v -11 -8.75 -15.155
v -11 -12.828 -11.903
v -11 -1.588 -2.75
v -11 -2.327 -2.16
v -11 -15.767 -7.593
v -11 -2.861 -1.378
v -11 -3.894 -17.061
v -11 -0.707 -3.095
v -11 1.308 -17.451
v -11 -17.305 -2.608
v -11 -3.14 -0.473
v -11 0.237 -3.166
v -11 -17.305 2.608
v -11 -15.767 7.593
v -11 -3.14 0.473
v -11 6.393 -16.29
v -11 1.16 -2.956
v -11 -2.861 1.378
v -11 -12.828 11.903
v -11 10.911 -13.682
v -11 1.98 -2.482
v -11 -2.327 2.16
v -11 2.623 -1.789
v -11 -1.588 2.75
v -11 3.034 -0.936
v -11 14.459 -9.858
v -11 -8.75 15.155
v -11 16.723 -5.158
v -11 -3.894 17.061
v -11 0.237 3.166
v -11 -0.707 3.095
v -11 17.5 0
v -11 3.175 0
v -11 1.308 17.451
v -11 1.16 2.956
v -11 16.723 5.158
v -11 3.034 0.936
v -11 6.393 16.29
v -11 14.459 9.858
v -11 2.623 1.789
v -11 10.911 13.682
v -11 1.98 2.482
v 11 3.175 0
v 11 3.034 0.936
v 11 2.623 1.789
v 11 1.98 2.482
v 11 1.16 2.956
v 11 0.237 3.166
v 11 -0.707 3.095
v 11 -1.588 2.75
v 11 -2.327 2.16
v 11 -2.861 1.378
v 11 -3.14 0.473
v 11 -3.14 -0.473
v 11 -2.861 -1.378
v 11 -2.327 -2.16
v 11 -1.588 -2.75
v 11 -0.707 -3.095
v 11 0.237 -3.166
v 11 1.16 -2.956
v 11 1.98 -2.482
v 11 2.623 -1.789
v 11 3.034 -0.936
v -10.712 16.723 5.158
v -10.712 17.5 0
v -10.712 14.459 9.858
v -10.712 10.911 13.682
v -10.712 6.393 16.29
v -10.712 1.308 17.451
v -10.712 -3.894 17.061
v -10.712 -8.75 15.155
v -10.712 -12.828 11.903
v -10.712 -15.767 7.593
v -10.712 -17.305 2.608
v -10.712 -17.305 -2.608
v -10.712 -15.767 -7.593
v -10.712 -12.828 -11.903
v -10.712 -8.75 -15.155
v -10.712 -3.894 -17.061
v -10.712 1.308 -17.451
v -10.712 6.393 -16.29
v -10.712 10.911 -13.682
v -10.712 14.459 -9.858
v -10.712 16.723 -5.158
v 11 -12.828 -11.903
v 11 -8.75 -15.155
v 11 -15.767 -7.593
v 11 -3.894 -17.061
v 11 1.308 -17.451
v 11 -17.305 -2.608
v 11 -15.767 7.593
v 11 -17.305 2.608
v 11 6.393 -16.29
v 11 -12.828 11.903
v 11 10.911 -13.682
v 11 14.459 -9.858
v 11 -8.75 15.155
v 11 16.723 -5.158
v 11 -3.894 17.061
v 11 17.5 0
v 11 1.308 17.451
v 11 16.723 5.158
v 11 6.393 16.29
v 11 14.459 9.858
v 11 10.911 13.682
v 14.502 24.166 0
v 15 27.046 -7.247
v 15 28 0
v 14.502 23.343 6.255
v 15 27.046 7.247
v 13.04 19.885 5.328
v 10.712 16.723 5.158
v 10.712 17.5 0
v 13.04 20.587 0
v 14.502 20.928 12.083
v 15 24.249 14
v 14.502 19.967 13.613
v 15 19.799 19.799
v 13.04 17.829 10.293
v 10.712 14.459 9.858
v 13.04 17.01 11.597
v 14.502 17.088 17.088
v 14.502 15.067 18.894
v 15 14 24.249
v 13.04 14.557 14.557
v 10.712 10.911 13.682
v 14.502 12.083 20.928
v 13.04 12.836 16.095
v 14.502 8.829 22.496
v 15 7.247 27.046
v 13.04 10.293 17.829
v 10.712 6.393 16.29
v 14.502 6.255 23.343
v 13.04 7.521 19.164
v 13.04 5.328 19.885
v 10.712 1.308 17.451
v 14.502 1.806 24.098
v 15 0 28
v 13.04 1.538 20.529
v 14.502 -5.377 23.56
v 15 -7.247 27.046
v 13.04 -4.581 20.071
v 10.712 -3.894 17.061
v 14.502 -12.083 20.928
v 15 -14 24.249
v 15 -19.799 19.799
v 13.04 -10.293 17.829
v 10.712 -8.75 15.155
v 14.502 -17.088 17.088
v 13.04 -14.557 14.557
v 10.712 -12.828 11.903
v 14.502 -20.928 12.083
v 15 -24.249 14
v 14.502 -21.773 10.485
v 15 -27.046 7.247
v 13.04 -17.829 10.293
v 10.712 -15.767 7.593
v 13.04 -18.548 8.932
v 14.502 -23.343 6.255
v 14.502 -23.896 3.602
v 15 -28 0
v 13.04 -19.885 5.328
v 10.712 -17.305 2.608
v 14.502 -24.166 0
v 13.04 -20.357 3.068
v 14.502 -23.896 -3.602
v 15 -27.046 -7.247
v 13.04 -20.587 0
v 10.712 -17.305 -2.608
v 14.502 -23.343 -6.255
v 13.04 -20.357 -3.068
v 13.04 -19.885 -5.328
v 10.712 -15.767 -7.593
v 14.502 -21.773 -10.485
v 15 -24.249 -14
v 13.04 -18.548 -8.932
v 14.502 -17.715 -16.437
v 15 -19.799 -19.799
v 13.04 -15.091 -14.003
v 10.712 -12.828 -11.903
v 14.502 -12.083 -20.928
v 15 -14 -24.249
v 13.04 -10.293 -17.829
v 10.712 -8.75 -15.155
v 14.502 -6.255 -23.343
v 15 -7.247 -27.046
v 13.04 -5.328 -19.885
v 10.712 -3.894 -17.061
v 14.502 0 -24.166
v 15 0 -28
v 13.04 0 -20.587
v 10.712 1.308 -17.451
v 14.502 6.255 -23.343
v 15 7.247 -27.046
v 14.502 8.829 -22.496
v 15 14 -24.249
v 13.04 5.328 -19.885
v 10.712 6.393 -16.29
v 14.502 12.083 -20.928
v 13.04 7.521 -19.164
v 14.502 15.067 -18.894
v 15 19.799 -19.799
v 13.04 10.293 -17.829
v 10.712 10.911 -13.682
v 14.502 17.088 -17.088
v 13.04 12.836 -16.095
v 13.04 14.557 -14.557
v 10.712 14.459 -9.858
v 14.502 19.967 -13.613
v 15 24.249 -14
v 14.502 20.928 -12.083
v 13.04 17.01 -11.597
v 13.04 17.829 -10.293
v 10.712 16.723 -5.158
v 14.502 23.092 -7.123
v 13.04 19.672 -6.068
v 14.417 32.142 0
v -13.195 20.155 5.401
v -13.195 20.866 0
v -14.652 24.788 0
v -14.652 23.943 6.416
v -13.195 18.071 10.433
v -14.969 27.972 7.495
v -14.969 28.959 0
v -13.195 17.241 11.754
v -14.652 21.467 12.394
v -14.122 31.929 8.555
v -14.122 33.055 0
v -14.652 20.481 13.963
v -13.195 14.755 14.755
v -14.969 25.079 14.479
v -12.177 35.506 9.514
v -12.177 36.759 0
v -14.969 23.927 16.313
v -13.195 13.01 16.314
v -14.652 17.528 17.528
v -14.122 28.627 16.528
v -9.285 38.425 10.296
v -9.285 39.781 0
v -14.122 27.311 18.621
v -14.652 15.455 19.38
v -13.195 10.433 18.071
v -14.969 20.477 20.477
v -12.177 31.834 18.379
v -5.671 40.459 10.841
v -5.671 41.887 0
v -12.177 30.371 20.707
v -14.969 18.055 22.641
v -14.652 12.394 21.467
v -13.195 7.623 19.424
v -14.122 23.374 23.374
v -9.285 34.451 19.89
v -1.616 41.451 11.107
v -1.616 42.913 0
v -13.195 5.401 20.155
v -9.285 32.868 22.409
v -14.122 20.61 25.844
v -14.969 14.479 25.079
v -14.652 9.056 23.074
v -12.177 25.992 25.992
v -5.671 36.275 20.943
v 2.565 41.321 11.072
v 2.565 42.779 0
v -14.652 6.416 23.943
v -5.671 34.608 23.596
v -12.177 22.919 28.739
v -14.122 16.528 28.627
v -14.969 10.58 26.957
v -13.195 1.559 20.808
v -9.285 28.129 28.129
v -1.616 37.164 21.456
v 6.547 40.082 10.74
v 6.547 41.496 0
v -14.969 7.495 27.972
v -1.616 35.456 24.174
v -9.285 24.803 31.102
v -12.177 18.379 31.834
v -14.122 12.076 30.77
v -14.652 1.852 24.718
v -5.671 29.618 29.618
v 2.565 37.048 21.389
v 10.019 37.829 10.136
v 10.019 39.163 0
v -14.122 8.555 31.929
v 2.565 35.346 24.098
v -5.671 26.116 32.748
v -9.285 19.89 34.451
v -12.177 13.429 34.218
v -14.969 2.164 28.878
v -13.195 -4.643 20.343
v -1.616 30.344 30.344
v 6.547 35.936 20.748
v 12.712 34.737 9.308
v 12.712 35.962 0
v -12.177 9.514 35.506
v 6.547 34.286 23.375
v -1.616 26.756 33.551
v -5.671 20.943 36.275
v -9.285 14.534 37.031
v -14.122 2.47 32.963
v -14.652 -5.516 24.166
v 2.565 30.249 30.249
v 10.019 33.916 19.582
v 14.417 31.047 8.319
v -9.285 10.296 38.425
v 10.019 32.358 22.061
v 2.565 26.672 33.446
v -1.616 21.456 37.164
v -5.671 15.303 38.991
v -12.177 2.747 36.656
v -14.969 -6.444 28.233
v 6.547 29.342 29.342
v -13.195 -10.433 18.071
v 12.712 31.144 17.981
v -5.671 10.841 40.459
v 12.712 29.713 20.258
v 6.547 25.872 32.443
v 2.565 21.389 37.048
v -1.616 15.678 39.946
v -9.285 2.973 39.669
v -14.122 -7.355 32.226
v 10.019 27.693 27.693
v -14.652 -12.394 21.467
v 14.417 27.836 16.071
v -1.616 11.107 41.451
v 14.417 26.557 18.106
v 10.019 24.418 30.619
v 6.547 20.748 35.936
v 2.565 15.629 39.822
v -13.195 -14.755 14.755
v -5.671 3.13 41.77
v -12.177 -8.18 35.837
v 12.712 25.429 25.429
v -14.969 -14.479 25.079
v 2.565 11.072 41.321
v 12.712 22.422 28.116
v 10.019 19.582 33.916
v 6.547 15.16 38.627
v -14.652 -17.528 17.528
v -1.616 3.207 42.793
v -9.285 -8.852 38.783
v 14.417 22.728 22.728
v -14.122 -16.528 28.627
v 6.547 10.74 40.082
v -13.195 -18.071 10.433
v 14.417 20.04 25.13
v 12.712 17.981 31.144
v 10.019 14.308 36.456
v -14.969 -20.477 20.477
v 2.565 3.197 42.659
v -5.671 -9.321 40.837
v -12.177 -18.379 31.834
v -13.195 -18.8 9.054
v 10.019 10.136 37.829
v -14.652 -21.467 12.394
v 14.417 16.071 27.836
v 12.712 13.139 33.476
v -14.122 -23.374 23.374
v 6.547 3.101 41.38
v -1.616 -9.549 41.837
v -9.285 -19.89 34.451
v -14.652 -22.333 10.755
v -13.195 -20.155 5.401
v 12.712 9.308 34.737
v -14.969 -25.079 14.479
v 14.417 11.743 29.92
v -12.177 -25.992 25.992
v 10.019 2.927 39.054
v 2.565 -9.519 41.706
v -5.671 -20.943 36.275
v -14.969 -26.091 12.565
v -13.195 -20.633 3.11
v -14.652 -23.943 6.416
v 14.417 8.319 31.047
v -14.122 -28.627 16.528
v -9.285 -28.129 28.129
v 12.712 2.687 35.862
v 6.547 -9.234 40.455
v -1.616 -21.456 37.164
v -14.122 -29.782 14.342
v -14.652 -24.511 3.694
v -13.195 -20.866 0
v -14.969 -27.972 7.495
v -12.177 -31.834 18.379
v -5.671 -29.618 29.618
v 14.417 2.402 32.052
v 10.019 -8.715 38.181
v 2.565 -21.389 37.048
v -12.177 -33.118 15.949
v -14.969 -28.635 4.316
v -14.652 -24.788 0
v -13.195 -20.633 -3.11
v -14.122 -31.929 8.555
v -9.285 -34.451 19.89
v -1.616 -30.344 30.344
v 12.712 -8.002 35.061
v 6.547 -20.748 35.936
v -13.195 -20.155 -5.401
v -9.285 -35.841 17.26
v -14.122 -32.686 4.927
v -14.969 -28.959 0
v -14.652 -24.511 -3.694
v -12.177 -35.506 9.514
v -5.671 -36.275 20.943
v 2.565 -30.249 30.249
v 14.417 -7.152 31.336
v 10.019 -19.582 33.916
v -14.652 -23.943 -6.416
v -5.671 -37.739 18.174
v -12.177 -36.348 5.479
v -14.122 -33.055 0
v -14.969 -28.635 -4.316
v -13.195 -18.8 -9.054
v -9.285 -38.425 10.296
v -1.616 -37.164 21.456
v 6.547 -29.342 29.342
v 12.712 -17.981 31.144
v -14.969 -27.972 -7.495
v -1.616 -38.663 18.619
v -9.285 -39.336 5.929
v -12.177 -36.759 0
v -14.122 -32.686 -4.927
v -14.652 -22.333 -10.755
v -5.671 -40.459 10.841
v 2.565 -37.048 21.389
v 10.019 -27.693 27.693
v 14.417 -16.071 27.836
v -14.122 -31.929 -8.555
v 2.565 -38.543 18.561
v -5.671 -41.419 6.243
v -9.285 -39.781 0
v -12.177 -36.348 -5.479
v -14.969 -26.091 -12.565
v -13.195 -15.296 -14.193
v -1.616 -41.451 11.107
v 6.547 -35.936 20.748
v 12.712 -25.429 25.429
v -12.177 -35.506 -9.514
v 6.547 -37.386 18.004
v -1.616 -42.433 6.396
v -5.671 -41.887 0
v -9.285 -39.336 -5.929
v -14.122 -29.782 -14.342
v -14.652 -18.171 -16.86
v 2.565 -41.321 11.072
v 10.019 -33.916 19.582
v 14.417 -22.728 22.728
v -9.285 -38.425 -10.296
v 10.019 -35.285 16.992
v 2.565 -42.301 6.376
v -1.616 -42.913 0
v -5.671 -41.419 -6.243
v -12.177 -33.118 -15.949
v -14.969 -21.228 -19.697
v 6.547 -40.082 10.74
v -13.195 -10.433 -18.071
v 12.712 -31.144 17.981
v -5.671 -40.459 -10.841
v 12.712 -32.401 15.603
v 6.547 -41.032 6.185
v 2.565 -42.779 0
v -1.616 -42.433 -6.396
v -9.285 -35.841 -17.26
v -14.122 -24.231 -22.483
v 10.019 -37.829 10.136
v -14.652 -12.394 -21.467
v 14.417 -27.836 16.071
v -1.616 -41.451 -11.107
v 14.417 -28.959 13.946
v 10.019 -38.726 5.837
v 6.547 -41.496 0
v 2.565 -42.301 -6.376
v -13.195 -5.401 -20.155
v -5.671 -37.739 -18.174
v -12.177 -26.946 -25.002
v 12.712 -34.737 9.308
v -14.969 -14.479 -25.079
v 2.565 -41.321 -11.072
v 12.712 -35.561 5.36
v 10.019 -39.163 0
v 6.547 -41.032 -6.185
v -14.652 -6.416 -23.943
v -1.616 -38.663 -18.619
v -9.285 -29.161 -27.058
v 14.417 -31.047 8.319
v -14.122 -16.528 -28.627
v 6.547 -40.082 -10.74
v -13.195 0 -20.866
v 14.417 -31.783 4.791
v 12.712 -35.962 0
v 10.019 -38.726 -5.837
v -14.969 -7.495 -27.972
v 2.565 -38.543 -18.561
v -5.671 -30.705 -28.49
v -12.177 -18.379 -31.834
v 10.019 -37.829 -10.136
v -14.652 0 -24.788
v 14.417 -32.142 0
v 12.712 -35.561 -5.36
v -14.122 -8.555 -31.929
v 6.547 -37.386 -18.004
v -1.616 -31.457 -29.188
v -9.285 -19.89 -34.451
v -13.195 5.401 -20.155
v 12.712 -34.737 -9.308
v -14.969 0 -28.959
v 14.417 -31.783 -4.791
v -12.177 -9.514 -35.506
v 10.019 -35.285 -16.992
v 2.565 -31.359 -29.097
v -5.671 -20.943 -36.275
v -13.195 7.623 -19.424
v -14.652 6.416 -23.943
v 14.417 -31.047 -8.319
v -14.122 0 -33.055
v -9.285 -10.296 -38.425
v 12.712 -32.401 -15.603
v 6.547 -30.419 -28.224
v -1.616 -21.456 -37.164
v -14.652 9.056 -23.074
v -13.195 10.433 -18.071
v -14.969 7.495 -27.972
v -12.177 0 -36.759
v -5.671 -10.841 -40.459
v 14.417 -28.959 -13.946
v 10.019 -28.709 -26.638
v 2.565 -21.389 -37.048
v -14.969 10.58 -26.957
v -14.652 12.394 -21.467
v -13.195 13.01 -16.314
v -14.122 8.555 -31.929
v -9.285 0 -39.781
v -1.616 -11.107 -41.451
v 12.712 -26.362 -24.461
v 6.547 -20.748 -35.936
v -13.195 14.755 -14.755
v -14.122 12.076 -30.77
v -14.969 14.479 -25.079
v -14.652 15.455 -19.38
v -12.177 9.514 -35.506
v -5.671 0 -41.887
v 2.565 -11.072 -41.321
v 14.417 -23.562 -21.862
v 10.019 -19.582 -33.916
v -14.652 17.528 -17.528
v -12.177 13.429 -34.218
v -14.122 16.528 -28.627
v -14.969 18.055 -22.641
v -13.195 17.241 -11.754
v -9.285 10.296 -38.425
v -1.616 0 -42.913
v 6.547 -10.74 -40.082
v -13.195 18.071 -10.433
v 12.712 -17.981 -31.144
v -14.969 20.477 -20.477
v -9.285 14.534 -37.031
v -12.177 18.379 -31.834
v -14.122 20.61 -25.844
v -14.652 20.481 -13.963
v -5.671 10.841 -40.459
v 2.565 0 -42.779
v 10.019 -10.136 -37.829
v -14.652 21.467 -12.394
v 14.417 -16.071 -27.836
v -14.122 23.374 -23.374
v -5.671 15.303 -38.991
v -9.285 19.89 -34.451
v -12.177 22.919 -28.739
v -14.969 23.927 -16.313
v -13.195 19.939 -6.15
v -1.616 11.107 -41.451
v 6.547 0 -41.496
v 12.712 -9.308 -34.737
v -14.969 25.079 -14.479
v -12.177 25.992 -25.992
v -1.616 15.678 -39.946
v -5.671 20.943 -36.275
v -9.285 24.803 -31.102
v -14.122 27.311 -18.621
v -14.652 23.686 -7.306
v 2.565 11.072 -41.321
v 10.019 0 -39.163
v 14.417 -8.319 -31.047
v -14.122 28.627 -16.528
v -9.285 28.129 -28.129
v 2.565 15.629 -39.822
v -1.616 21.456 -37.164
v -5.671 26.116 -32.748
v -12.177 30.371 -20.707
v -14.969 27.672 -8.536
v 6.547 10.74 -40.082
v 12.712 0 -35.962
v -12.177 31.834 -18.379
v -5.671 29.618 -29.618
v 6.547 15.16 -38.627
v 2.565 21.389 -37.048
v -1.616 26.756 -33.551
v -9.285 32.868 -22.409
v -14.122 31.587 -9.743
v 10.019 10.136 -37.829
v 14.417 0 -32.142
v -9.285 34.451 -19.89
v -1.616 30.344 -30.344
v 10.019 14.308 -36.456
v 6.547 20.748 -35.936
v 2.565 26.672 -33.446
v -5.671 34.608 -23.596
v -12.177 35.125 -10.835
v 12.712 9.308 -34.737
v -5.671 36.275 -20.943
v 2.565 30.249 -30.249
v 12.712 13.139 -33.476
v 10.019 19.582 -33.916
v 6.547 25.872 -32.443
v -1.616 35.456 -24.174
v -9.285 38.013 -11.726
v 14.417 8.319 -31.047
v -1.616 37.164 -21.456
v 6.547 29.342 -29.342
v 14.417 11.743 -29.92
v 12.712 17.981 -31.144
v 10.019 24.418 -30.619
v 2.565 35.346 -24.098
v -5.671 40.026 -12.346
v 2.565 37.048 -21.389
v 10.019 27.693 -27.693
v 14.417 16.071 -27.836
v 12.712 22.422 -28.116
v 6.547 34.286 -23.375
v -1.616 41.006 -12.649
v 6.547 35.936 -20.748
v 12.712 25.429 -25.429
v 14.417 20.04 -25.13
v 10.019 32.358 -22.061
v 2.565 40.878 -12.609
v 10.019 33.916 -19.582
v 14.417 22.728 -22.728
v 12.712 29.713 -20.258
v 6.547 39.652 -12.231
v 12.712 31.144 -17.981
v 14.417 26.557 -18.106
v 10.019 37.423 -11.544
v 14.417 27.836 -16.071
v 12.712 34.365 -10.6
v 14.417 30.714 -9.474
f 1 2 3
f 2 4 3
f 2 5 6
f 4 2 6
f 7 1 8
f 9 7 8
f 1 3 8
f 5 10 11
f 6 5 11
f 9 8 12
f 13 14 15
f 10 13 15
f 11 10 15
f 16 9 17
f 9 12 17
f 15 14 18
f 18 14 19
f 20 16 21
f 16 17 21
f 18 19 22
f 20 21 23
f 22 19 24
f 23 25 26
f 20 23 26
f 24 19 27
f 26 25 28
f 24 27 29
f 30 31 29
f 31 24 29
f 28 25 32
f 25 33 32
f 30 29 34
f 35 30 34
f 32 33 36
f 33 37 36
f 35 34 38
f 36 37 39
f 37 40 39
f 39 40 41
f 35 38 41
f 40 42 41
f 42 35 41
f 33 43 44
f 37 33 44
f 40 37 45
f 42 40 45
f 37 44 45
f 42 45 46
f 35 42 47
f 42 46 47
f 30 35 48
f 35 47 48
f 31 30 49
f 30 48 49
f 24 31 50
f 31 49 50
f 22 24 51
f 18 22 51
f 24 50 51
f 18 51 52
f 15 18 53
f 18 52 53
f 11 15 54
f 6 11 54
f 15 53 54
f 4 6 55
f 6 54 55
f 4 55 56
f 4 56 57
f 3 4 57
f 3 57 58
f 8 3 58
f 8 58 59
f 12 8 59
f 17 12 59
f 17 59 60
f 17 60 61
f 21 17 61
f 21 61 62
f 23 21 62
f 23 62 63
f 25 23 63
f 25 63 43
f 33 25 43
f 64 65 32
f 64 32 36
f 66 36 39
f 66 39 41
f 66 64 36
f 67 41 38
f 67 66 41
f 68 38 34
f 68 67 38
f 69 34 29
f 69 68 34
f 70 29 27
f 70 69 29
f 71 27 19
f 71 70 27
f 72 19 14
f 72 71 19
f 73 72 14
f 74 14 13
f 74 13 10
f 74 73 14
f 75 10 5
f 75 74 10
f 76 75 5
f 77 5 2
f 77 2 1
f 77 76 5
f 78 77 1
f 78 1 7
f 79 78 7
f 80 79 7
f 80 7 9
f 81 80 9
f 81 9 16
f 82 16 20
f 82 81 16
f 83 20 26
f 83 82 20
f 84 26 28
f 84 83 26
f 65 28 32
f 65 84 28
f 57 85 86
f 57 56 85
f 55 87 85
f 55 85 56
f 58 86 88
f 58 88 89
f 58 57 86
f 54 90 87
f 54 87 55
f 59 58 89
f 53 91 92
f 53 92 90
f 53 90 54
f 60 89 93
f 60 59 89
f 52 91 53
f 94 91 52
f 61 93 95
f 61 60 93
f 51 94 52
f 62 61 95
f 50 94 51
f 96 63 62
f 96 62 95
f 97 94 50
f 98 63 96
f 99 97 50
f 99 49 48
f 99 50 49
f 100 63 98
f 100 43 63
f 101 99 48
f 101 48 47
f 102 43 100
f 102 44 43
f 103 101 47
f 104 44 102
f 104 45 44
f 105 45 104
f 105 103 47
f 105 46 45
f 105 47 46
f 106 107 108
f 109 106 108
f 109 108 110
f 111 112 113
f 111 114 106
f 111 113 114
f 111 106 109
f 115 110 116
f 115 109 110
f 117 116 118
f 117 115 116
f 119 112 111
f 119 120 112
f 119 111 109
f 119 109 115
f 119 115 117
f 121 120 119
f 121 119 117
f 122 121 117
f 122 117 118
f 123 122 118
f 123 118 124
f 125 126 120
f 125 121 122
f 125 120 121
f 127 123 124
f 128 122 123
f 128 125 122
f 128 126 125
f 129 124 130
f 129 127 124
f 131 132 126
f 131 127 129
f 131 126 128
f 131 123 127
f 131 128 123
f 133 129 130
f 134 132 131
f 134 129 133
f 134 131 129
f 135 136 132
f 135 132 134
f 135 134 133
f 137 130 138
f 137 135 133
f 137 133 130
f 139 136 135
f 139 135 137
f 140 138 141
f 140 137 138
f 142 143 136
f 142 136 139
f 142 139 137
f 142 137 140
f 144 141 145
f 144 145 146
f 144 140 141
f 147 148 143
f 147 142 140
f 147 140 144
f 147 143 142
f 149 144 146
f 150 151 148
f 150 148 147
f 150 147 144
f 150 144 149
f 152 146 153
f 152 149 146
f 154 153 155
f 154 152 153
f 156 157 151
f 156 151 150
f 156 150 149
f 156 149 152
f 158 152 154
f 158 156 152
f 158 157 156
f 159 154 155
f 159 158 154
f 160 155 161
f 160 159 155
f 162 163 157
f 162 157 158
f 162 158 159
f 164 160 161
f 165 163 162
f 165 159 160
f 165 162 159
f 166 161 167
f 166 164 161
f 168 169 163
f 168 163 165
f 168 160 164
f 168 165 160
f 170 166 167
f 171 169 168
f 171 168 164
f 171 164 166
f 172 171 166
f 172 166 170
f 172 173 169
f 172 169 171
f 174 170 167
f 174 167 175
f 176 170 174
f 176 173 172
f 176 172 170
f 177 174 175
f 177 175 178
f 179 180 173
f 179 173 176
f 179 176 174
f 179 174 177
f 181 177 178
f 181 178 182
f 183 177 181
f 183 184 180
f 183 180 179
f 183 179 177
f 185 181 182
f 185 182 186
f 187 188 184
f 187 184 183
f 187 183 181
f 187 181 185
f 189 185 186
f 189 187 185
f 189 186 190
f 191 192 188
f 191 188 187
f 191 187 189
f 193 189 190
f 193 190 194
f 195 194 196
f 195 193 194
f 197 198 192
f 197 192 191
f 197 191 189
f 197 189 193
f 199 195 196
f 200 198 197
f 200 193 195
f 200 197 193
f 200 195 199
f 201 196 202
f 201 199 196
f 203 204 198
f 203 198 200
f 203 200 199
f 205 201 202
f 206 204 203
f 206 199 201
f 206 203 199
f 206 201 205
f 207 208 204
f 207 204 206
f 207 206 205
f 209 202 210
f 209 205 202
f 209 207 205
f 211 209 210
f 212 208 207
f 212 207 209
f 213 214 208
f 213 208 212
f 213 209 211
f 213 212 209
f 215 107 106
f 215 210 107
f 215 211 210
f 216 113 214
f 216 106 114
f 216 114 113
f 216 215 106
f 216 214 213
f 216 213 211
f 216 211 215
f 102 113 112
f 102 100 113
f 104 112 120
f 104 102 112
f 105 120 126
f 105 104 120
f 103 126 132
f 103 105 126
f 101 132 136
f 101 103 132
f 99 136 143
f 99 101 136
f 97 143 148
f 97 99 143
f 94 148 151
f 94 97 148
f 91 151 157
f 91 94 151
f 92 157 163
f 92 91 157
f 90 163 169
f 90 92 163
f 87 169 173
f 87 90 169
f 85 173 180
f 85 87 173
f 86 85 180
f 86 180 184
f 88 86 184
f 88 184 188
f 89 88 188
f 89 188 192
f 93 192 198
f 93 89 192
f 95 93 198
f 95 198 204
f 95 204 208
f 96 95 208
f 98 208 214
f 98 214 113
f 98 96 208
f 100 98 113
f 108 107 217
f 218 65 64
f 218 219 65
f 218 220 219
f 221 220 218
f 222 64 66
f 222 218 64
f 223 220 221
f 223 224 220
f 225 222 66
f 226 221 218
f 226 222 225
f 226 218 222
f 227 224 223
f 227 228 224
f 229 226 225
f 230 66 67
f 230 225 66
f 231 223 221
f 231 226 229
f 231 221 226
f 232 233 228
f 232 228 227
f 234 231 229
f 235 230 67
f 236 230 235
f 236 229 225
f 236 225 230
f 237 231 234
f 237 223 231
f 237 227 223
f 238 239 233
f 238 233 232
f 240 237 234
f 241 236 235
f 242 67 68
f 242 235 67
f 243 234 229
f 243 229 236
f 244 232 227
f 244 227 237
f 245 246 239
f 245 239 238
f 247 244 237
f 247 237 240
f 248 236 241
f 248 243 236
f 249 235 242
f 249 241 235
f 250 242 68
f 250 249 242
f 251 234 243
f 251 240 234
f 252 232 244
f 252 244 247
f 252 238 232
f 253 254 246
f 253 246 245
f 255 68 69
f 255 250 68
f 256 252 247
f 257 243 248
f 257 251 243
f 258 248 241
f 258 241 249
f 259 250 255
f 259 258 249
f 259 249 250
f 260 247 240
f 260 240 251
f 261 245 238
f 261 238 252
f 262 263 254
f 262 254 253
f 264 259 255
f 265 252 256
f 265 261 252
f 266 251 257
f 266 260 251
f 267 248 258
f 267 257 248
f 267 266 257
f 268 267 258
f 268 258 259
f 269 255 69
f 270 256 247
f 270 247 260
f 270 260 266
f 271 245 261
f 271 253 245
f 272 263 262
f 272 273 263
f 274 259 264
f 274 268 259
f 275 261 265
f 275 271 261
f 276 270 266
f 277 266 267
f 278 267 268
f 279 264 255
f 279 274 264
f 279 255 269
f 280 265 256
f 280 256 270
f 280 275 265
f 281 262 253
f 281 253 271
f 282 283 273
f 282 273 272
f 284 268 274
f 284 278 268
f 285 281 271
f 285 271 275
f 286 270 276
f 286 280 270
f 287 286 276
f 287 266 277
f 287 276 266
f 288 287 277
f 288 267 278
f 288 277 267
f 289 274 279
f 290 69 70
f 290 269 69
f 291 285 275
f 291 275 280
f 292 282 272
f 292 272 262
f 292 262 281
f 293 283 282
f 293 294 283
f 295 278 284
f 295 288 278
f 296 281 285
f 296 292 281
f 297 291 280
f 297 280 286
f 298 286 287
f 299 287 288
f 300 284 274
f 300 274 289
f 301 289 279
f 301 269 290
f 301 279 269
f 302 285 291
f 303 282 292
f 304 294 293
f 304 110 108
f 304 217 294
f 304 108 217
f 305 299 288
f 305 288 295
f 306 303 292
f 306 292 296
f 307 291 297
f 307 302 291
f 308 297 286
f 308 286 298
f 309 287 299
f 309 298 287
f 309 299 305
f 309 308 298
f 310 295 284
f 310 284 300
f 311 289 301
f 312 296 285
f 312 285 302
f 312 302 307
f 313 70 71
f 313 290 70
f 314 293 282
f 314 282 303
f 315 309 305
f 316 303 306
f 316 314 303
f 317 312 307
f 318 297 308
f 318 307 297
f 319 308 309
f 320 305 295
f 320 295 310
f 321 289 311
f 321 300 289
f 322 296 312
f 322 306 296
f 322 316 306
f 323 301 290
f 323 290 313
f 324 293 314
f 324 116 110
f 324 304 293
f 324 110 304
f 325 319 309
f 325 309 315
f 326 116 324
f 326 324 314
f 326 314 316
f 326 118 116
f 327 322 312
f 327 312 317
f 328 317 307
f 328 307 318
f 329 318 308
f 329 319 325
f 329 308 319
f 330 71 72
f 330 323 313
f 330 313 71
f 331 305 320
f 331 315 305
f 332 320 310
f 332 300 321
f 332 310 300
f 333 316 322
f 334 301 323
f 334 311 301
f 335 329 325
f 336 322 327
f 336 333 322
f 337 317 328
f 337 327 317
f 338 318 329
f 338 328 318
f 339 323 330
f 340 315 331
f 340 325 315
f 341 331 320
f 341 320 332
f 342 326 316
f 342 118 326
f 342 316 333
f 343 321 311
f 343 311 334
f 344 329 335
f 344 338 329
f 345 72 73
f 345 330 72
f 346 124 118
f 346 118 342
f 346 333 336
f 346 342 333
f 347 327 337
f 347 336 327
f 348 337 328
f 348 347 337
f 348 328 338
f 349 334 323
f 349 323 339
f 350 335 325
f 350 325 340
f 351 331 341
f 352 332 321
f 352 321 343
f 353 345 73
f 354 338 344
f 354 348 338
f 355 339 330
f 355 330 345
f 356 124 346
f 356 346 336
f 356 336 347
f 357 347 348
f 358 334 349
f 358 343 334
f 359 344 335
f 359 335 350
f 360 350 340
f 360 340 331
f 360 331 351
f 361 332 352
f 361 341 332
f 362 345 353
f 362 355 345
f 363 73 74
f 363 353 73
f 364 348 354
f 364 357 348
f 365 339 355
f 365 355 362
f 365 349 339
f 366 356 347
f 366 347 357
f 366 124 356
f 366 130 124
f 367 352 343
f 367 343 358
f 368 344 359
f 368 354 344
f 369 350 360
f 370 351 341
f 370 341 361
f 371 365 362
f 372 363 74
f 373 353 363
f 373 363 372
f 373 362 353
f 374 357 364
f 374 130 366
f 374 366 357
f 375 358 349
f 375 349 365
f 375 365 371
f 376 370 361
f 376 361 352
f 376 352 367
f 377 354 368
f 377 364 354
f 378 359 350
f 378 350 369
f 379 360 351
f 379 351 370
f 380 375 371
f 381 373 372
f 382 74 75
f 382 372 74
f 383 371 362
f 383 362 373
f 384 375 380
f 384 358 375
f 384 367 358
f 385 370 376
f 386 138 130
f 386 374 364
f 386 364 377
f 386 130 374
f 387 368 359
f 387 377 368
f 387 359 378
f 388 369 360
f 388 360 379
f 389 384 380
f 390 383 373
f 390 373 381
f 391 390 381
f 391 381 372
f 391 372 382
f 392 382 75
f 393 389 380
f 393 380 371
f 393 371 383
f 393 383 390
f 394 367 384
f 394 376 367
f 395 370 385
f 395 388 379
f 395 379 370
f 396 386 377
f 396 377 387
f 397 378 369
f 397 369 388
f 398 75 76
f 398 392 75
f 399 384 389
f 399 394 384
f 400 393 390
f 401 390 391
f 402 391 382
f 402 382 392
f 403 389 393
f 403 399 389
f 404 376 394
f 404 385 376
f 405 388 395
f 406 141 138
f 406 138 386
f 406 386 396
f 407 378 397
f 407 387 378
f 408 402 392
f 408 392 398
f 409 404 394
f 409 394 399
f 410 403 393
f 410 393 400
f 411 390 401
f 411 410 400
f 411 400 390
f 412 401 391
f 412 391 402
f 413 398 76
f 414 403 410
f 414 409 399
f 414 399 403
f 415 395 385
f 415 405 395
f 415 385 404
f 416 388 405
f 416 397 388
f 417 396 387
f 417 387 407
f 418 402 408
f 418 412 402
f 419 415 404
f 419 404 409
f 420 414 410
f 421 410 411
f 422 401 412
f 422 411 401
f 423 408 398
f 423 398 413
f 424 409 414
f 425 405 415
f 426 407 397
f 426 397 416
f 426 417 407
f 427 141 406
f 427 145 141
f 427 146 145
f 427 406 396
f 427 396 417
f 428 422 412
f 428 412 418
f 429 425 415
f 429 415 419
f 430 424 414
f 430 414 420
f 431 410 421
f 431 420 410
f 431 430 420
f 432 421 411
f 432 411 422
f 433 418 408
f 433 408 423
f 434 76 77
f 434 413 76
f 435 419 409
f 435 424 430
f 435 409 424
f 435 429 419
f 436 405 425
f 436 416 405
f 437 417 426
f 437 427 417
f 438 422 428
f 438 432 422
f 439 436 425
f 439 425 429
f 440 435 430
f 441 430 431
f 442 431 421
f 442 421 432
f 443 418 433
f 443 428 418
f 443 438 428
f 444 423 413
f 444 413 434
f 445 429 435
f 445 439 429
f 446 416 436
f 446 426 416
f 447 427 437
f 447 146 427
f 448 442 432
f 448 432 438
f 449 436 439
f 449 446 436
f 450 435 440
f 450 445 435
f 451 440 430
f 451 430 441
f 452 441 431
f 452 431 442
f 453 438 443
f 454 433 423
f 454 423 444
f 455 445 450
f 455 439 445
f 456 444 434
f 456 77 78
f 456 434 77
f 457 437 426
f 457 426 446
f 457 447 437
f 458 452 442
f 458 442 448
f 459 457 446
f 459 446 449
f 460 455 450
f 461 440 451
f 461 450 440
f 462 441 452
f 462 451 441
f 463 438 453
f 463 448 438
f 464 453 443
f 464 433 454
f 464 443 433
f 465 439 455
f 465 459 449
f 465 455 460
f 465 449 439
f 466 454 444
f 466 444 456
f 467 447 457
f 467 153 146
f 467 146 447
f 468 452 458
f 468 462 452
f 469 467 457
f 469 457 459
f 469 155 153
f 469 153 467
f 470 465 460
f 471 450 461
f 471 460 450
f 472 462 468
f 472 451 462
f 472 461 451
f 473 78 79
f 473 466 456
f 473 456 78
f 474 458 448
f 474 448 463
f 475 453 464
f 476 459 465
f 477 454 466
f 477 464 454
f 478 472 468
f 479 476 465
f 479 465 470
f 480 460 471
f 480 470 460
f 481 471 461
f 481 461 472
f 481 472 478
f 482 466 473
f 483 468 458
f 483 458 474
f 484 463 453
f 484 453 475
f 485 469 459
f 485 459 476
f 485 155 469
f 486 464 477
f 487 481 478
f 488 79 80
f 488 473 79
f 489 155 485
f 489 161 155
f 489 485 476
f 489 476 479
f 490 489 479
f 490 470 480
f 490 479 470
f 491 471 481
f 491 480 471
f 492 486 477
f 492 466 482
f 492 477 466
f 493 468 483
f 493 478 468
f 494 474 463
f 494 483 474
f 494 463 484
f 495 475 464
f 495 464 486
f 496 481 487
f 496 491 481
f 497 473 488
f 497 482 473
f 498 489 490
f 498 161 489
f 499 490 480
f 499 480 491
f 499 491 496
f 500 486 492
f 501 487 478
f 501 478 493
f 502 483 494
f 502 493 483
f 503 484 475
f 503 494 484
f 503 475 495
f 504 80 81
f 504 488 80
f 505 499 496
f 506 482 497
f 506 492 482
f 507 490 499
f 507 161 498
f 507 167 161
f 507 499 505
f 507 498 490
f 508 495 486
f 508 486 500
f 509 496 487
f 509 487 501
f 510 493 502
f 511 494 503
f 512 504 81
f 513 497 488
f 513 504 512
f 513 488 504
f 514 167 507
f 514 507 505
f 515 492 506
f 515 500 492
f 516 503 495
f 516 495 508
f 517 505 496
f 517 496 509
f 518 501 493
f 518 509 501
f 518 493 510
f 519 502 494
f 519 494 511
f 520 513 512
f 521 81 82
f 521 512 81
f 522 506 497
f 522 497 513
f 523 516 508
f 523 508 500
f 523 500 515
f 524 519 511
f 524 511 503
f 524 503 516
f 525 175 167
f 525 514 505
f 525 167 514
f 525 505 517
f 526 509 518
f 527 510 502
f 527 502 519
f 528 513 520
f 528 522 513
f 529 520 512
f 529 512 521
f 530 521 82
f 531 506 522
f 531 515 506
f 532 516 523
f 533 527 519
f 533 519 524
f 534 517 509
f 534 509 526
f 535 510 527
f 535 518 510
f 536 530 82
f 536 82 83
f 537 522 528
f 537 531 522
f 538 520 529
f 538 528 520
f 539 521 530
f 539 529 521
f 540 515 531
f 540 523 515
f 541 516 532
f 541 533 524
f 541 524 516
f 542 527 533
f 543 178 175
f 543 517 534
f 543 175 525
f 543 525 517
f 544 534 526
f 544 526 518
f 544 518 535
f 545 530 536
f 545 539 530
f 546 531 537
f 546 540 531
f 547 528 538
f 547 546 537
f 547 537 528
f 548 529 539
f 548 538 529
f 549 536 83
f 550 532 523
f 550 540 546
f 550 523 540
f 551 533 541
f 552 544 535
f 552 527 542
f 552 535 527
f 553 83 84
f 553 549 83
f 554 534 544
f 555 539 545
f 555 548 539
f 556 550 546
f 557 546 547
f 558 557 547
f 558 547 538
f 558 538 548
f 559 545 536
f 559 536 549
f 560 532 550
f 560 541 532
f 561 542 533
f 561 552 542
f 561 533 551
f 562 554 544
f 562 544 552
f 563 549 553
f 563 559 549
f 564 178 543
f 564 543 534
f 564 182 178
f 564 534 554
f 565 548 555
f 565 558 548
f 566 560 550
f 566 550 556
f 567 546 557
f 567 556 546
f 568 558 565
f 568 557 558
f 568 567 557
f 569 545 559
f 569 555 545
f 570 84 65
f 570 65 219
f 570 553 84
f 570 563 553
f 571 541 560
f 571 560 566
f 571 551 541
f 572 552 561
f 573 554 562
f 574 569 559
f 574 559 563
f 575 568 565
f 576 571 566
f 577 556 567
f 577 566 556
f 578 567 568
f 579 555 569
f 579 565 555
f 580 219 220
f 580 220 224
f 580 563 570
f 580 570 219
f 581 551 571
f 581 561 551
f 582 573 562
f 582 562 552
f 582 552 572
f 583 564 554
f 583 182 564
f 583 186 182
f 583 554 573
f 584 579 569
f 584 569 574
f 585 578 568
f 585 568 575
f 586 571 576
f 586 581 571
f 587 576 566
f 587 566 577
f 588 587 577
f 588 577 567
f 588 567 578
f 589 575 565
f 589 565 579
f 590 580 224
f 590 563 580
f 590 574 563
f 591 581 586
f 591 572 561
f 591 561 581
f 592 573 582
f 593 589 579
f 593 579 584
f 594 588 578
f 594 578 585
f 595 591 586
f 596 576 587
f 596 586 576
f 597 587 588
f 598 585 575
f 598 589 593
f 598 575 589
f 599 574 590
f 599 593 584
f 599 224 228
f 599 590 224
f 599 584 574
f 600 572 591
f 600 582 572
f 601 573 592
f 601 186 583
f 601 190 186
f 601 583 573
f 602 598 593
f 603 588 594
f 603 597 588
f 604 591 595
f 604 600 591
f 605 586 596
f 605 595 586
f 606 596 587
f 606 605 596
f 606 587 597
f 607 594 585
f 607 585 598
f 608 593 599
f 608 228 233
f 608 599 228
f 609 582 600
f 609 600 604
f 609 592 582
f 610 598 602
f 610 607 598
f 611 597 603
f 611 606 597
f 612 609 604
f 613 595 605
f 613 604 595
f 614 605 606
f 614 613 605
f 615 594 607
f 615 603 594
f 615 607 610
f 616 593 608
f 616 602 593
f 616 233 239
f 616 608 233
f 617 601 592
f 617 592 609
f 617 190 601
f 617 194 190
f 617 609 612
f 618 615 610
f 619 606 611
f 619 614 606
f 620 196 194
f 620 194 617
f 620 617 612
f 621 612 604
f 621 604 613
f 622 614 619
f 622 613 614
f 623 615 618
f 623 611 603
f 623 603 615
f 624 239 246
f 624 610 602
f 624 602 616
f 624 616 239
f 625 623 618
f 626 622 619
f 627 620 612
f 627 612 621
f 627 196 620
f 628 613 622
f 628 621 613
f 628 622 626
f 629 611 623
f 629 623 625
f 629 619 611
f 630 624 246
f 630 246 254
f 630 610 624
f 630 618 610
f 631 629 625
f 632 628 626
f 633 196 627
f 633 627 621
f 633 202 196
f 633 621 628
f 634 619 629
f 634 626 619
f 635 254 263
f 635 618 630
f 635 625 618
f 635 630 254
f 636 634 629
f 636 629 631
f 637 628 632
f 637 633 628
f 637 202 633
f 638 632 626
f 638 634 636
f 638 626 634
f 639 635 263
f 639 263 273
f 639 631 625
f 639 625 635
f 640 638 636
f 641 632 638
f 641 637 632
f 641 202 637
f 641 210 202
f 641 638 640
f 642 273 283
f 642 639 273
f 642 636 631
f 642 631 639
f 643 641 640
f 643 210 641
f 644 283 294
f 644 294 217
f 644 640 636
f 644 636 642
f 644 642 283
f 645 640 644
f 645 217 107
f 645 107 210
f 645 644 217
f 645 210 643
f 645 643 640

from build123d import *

# Parameters (mm, degrees)
F0_R     = 17.5
F1_DEPTH = 11
F3_R     = 15
F5_R     = 3.175
F6_DEPTH = 26.001


with BuildPart() as f1:
    # F0 (on Right) → F1 (new body, symmetric)
    with BuildSketch(Plane.YZ):
        Circle(F0_R)
    extrude(amount=F1_DEPTH, both=True)

    # F4: sweep along a path in F2
    with BuildLine(Plane.YZ) as f4_path:
        CenterArc((0, 0), 28, 0, 360)
    # F3 (on Front) → F4 (sweep)
    with BuildSketch(Plane.XZ):
        with Locations((0, -28)):
            Circle(F3_R)
    sweep(path=f4_path.line)

    # F5 (on face) → F6 (cut, through all)
    with BuildSketch(Plane.YZ.offset(11)):
        Circle(F5_R)
    extrude(amount=-F6_DEPTH, mode=Mode.SUBTRACT)


solid = f1.part
